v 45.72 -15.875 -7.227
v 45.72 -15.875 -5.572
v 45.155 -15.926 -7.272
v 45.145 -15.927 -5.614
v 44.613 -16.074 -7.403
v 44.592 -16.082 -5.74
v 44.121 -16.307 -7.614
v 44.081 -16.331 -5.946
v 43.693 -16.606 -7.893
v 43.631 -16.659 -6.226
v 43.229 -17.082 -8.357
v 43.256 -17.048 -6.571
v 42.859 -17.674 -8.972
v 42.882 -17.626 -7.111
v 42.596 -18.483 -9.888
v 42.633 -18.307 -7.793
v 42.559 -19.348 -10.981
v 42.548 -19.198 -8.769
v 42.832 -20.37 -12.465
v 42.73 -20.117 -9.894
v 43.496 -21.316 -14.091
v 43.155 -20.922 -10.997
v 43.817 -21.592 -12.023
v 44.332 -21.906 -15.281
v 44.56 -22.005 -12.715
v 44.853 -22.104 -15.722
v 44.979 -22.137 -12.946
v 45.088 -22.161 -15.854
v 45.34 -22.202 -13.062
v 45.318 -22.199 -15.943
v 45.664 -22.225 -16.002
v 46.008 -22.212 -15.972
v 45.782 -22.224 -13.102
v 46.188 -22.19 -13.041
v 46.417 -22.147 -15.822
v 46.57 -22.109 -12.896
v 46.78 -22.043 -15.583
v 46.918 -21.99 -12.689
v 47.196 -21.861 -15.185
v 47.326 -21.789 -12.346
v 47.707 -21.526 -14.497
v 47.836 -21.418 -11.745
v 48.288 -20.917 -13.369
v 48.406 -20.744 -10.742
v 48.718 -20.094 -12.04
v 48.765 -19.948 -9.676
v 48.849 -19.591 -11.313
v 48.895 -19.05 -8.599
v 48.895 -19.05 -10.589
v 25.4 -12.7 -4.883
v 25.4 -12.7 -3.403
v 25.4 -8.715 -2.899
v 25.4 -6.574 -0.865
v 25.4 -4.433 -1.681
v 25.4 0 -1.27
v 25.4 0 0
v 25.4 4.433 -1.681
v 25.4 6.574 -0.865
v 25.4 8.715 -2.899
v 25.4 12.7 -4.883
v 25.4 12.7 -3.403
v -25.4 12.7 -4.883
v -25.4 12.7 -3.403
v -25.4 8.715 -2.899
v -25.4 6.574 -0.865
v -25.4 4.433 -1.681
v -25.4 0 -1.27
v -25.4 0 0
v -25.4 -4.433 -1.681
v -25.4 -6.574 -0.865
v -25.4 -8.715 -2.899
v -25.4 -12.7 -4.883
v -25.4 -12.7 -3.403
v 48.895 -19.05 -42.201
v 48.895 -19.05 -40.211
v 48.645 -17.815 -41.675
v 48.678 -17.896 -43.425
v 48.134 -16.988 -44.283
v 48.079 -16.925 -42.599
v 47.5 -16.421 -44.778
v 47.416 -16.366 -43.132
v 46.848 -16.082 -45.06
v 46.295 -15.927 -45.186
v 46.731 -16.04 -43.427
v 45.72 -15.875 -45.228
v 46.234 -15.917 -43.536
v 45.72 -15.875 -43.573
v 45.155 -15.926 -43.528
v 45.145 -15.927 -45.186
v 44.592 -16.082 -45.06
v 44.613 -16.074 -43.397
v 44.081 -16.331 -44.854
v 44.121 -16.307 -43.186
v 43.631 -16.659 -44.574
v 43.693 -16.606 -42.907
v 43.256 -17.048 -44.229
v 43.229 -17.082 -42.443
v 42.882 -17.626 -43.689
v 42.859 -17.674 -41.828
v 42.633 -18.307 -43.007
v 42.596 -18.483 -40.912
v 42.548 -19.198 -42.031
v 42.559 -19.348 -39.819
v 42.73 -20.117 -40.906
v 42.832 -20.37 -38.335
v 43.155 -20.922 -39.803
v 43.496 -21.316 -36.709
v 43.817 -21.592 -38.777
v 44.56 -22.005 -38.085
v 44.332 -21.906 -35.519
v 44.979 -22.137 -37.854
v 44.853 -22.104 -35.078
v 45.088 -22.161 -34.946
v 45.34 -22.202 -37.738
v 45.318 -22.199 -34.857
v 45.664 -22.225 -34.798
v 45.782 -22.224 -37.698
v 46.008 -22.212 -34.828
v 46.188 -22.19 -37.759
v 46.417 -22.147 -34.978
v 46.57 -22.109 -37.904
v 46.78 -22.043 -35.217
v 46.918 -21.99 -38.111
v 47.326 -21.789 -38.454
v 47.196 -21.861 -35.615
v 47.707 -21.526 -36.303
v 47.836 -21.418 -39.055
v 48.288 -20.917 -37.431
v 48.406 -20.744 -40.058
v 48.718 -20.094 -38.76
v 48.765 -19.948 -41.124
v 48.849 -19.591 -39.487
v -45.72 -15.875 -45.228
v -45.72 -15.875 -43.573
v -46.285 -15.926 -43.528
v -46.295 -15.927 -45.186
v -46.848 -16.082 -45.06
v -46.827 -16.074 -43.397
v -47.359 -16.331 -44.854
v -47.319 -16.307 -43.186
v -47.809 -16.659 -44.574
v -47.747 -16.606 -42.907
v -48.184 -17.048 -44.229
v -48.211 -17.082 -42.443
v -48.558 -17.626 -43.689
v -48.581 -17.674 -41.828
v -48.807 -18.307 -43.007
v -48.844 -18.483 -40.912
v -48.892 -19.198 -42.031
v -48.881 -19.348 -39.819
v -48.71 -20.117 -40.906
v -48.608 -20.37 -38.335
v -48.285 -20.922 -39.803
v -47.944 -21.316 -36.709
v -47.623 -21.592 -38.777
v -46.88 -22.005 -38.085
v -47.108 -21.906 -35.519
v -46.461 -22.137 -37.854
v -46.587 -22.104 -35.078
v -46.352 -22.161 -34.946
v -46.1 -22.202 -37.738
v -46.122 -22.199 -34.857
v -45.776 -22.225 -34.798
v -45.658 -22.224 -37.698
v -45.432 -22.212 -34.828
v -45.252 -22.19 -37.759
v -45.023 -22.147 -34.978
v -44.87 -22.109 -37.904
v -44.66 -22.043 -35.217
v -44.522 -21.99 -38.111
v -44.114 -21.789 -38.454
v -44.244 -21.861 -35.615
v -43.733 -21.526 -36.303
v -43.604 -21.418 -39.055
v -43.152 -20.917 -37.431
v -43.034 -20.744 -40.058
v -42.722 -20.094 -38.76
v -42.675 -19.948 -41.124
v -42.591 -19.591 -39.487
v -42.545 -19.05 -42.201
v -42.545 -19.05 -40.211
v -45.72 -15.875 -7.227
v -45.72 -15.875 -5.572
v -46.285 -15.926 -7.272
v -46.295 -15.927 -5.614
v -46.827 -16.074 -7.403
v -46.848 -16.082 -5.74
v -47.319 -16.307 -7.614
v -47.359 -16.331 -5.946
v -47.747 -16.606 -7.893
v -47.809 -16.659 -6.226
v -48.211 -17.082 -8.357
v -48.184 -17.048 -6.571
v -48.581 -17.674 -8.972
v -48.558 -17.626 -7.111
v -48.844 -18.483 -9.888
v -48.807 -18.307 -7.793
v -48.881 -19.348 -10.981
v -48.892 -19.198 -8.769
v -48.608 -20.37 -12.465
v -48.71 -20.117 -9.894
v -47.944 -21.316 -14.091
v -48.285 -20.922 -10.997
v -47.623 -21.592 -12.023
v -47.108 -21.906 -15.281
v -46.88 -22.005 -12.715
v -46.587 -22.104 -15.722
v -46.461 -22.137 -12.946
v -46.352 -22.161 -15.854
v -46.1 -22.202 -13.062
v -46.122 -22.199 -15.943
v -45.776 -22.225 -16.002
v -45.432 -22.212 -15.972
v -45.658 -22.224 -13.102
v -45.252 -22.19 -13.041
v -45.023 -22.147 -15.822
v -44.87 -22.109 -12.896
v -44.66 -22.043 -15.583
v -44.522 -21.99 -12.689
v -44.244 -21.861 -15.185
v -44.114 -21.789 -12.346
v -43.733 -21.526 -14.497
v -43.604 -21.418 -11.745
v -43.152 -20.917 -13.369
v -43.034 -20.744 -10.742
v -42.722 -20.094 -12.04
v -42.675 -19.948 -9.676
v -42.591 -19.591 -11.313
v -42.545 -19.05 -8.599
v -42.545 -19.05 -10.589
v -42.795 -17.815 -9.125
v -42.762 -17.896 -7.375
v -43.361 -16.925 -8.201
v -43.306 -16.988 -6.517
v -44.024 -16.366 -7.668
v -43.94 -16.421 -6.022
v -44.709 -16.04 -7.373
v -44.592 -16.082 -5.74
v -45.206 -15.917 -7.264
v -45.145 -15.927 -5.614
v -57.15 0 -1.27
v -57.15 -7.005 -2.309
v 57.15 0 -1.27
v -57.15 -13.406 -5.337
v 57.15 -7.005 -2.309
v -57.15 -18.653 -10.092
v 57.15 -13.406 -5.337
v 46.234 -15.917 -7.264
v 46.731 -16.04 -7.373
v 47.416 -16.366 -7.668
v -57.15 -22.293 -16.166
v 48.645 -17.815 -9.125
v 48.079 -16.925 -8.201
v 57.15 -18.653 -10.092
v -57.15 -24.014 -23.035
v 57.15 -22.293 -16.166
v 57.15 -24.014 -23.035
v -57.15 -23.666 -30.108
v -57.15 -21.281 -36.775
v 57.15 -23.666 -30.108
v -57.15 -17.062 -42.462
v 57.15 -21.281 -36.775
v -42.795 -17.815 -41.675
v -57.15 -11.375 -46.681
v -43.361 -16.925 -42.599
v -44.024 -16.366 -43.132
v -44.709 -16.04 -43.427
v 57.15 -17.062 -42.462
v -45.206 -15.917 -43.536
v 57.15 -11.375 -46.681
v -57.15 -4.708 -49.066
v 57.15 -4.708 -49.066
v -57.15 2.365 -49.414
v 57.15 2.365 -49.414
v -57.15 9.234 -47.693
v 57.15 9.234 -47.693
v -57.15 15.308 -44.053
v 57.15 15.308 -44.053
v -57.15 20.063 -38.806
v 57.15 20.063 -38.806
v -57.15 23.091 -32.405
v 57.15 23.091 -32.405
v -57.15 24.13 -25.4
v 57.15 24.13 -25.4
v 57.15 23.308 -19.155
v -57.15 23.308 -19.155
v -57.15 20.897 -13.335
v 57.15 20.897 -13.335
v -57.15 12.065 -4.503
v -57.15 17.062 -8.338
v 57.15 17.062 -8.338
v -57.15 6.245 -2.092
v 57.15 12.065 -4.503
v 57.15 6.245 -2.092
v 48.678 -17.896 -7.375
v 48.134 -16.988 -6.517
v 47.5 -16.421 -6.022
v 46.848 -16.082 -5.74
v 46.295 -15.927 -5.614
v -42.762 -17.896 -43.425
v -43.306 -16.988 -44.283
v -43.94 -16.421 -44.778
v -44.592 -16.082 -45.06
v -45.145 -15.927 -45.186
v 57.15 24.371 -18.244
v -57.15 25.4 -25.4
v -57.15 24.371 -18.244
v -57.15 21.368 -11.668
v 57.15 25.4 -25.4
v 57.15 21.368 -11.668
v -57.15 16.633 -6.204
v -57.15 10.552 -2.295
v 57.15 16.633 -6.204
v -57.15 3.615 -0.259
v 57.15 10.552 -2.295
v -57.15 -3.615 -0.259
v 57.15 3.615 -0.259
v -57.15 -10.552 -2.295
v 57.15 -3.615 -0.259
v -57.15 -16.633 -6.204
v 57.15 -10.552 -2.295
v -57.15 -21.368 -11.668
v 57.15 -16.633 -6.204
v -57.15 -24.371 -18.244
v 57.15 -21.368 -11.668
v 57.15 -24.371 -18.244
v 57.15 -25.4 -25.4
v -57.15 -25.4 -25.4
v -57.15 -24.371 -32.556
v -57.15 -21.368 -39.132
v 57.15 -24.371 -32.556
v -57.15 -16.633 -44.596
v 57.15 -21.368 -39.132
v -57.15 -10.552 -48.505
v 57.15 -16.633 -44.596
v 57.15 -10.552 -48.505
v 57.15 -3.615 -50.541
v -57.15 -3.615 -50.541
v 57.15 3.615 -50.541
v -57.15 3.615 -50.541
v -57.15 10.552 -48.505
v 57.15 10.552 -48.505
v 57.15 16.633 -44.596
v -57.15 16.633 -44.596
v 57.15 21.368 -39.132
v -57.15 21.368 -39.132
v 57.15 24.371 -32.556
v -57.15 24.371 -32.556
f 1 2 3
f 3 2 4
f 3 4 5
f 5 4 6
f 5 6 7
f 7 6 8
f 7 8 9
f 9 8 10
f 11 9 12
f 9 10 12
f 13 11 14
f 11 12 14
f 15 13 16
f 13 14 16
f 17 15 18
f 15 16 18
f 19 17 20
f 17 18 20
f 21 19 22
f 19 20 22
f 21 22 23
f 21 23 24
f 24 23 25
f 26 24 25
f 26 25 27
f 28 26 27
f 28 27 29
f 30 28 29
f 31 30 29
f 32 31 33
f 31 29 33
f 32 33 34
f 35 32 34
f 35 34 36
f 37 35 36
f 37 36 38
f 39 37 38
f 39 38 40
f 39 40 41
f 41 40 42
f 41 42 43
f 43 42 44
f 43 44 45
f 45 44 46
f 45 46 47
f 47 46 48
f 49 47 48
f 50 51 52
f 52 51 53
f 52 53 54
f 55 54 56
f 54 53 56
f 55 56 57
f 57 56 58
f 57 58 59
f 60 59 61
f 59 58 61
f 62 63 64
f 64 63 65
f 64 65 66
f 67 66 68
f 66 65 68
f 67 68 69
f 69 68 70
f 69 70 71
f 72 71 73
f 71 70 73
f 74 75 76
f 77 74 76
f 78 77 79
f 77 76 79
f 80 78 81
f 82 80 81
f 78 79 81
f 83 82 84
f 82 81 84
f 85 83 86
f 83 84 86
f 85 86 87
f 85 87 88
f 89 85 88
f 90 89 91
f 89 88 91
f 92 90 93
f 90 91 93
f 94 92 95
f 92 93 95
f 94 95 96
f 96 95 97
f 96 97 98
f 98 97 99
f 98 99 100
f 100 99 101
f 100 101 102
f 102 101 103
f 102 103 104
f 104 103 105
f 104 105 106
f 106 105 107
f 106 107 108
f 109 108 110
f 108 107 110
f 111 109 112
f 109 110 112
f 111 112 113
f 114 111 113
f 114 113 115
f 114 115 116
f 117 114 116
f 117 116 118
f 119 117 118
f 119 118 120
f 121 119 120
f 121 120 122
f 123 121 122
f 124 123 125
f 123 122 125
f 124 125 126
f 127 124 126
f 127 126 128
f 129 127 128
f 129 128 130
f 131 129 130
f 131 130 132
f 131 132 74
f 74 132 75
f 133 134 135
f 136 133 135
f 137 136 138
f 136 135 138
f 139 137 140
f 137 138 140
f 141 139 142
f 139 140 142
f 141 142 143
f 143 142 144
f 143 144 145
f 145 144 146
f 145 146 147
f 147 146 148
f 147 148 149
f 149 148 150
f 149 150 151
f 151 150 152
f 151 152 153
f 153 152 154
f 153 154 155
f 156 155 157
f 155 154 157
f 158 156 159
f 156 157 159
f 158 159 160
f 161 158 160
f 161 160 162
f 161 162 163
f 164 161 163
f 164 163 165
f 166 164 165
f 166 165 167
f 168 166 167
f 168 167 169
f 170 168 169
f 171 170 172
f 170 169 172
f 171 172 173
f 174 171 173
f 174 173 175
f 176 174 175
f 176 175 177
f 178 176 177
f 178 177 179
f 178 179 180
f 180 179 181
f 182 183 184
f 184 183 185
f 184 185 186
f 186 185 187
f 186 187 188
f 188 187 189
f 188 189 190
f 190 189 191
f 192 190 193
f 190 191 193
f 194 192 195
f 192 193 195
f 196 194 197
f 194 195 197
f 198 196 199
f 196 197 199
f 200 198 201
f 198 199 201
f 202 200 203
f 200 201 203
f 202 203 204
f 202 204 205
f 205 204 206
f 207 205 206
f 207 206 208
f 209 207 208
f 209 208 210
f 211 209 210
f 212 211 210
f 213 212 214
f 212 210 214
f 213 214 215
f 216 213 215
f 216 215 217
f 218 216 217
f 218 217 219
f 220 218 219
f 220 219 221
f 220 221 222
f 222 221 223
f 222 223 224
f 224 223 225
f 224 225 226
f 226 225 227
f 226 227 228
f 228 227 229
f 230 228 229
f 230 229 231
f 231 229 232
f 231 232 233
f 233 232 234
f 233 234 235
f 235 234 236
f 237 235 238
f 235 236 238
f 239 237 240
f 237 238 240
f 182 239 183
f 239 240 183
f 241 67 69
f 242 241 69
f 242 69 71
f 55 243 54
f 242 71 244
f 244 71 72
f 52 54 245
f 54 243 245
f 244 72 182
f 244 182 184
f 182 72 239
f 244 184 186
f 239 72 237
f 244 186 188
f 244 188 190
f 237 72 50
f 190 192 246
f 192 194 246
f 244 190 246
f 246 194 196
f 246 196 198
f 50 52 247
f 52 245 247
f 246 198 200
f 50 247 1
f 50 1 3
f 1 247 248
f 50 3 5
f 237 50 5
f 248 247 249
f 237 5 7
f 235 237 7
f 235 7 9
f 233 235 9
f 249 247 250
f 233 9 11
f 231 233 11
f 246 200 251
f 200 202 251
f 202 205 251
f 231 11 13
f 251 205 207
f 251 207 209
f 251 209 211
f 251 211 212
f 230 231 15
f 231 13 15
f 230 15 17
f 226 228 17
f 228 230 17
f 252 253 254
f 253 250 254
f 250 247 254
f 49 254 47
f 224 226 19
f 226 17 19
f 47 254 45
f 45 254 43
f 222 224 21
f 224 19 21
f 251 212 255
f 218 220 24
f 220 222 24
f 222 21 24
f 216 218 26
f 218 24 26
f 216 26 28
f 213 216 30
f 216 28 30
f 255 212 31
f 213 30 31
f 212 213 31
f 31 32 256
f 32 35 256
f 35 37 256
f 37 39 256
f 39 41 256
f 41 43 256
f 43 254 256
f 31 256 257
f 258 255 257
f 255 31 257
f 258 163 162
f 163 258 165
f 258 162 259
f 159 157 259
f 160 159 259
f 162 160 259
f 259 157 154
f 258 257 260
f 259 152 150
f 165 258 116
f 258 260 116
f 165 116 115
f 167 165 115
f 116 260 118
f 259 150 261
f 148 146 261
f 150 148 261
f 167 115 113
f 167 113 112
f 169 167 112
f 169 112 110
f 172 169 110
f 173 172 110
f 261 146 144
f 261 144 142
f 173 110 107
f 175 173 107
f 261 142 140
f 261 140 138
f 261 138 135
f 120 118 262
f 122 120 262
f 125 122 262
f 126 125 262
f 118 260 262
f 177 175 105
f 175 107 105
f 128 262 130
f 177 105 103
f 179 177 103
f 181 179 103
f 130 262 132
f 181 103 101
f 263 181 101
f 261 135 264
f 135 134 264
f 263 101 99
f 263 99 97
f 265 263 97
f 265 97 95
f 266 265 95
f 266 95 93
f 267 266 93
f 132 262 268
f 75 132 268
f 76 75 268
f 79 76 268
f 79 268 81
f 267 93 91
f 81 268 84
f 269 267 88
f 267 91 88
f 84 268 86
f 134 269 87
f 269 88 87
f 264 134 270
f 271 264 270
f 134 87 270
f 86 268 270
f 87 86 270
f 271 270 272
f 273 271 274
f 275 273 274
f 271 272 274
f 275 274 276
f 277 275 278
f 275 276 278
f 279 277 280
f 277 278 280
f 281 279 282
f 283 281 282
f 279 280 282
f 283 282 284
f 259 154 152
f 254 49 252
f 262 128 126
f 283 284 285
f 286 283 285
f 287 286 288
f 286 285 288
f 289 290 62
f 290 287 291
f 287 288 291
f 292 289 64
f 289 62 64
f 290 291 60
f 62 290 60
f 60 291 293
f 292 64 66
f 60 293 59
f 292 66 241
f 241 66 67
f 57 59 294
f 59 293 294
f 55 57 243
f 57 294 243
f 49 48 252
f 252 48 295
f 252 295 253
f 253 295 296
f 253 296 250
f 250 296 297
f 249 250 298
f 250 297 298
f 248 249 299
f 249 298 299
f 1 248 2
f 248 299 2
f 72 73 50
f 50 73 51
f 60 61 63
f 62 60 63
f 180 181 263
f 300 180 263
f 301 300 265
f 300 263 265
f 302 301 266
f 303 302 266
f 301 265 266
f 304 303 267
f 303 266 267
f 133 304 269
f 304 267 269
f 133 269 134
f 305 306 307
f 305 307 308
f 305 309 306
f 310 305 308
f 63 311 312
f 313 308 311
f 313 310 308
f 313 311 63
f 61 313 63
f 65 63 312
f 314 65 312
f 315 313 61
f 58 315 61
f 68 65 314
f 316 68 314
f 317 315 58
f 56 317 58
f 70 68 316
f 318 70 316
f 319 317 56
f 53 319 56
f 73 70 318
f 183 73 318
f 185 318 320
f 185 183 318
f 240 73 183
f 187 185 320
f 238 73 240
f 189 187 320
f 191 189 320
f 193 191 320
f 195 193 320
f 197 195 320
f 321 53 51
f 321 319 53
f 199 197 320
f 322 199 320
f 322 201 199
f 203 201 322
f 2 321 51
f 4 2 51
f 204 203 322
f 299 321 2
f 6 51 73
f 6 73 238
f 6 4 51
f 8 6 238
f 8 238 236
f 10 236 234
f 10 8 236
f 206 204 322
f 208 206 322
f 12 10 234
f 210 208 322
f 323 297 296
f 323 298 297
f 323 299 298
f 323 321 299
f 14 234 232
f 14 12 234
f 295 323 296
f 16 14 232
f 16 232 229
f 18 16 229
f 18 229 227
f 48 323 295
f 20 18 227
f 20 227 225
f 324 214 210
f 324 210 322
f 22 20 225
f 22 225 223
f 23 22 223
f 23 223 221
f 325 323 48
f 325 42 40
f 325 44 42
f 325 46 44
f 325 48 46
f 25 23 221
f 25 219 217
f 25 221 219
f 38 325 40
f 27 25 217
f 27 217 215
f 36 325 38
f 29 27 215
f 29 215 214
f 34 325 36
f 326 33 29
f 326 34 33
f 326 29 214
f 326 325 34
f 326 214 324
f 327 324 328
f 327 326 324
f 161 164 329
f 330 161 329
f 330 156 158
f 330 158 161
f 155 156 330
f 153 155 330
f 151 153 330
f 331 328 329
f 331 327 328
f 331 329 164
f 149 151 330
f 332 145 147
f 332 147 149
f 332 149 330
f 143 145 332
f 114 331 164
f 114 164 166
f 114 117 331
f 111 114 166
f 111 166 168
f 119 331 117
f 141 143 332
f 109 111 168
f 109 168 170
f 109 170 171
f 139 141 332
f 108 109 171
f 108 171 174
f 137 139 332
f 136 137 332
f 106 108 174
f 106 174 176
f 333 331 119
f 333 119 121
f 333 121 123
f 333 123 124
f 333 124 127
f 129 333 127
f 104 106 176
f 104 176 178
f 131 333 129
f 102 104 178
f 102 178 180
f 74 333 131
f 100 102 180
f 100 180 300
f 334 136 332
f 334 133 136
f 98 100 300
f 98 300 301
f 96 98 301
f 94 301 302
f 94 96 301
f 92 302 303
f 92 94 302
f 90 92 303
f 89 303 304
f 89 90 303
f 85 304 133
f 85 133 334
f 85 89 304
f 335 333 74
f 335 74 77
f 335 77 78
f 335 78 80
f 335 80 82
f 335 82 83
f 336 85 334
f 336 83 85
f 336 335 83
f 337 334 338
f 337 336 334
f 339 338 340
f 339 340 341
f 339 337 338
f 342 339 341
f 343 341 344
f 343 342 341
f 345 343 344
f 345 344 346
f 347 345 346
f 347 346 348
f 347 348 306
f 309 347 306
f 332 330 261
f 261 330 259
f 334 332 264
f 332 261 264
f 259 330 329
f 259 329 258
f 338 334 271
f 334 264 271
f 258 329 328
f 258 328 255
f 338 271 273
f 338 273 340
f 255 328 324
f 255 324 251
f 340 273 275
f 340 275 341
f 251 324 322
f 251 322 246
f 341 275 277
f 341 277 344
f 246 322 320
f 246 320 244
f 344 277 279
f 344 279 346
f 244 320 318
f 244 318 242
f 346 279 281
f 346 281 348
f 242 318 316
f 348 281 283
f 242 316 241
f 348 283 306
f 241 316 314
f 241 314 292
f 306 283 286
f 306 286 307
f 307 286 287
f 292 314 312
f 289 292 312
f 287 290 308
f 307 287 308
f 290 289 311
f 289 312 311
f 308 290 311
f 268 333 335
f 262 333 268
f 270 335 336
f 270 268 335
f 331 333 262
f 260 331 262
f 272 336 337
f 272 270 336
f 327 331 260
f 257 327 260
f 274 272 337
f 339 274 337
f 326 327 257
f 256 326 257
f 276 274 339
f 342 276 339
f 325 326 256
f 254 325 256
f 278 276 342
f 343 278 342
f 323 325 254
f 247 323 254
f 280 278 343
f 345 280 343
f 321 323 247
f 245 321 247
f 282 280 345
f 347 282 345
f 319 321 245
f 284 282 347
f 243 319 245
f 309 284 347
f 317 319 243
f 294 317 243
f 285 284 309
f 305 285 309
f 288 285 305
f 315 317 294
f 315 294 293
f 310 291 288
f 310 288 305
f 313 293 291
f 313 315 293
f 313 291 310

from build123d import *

# Parameters (mm, degrees)
F0_R     = 25.4
F1_DEPTH = 57.15
F3_DEPTH = 25.4
F5_DEPTH = 114.3
F7_DEPTH = 76.2


with BuildPart() as f1:
    # F0 (on Right) → F1 (new body, symmetric)
    with BuildSketch(Plane.YZ):
        with Locations((0, -25.4)):
            Circle(F0_R)
    extrude(amount=F1_DEPTH, both=True)

    # F2 (on Top) → F3 (cut)
    with BuildSketch(Plane.XY):
        Polygon((-25.4, 12.7), (-25.4, 0), (-25.4, -12.7), (25.4, -12.7), (25.4, 0), (25.4, 12.7), align=None)
    extrude(amount=-F3_DEPTH, mode=Mode.SUBTRACT)

    # F4 (on face) → F5 (cut)
    with BuildSketch(Plane.YZ.offset(57.15)):
        with BuildLine():
            ThreePointArc((24.13, -25.4), (17.06248663, -8.33751337), (0, -1.27))
            ThreePointArc((0, -1.27), (-17.06248663, -42.46248663), (24.13, -25.4))
        make_face()
    extrude(amount=-F5_DEPTH, mode=Mode.SUBTRACT)

    # F6 (on Top) → F7 (cut)
    with BuildSketch(Plane.XY):
        with BuildLine():
            ThreePointArc((-42.545, -19.05), (-43.4749359697, -16.8049359697), (-45.72, -15.875))
            ThreePointArc((-45.72, -15.875), (-47.9650640303, -21.2950640303), (-42.545, -19.05))
        make_face()
        with BuildLine():
            ThreePointArc((48.895, -19.05), (47.9650640303, -16.8049359697), (45.72, -15.875))
            ThreePointArc((45.72, -15.875), (43.4749359697, -21.2950640303), (48.895, -19.05))
        make_face()
    extrude(amount=-F7_DEPTH, mode=Mode.SUBTRACT)


solid = f1.part
